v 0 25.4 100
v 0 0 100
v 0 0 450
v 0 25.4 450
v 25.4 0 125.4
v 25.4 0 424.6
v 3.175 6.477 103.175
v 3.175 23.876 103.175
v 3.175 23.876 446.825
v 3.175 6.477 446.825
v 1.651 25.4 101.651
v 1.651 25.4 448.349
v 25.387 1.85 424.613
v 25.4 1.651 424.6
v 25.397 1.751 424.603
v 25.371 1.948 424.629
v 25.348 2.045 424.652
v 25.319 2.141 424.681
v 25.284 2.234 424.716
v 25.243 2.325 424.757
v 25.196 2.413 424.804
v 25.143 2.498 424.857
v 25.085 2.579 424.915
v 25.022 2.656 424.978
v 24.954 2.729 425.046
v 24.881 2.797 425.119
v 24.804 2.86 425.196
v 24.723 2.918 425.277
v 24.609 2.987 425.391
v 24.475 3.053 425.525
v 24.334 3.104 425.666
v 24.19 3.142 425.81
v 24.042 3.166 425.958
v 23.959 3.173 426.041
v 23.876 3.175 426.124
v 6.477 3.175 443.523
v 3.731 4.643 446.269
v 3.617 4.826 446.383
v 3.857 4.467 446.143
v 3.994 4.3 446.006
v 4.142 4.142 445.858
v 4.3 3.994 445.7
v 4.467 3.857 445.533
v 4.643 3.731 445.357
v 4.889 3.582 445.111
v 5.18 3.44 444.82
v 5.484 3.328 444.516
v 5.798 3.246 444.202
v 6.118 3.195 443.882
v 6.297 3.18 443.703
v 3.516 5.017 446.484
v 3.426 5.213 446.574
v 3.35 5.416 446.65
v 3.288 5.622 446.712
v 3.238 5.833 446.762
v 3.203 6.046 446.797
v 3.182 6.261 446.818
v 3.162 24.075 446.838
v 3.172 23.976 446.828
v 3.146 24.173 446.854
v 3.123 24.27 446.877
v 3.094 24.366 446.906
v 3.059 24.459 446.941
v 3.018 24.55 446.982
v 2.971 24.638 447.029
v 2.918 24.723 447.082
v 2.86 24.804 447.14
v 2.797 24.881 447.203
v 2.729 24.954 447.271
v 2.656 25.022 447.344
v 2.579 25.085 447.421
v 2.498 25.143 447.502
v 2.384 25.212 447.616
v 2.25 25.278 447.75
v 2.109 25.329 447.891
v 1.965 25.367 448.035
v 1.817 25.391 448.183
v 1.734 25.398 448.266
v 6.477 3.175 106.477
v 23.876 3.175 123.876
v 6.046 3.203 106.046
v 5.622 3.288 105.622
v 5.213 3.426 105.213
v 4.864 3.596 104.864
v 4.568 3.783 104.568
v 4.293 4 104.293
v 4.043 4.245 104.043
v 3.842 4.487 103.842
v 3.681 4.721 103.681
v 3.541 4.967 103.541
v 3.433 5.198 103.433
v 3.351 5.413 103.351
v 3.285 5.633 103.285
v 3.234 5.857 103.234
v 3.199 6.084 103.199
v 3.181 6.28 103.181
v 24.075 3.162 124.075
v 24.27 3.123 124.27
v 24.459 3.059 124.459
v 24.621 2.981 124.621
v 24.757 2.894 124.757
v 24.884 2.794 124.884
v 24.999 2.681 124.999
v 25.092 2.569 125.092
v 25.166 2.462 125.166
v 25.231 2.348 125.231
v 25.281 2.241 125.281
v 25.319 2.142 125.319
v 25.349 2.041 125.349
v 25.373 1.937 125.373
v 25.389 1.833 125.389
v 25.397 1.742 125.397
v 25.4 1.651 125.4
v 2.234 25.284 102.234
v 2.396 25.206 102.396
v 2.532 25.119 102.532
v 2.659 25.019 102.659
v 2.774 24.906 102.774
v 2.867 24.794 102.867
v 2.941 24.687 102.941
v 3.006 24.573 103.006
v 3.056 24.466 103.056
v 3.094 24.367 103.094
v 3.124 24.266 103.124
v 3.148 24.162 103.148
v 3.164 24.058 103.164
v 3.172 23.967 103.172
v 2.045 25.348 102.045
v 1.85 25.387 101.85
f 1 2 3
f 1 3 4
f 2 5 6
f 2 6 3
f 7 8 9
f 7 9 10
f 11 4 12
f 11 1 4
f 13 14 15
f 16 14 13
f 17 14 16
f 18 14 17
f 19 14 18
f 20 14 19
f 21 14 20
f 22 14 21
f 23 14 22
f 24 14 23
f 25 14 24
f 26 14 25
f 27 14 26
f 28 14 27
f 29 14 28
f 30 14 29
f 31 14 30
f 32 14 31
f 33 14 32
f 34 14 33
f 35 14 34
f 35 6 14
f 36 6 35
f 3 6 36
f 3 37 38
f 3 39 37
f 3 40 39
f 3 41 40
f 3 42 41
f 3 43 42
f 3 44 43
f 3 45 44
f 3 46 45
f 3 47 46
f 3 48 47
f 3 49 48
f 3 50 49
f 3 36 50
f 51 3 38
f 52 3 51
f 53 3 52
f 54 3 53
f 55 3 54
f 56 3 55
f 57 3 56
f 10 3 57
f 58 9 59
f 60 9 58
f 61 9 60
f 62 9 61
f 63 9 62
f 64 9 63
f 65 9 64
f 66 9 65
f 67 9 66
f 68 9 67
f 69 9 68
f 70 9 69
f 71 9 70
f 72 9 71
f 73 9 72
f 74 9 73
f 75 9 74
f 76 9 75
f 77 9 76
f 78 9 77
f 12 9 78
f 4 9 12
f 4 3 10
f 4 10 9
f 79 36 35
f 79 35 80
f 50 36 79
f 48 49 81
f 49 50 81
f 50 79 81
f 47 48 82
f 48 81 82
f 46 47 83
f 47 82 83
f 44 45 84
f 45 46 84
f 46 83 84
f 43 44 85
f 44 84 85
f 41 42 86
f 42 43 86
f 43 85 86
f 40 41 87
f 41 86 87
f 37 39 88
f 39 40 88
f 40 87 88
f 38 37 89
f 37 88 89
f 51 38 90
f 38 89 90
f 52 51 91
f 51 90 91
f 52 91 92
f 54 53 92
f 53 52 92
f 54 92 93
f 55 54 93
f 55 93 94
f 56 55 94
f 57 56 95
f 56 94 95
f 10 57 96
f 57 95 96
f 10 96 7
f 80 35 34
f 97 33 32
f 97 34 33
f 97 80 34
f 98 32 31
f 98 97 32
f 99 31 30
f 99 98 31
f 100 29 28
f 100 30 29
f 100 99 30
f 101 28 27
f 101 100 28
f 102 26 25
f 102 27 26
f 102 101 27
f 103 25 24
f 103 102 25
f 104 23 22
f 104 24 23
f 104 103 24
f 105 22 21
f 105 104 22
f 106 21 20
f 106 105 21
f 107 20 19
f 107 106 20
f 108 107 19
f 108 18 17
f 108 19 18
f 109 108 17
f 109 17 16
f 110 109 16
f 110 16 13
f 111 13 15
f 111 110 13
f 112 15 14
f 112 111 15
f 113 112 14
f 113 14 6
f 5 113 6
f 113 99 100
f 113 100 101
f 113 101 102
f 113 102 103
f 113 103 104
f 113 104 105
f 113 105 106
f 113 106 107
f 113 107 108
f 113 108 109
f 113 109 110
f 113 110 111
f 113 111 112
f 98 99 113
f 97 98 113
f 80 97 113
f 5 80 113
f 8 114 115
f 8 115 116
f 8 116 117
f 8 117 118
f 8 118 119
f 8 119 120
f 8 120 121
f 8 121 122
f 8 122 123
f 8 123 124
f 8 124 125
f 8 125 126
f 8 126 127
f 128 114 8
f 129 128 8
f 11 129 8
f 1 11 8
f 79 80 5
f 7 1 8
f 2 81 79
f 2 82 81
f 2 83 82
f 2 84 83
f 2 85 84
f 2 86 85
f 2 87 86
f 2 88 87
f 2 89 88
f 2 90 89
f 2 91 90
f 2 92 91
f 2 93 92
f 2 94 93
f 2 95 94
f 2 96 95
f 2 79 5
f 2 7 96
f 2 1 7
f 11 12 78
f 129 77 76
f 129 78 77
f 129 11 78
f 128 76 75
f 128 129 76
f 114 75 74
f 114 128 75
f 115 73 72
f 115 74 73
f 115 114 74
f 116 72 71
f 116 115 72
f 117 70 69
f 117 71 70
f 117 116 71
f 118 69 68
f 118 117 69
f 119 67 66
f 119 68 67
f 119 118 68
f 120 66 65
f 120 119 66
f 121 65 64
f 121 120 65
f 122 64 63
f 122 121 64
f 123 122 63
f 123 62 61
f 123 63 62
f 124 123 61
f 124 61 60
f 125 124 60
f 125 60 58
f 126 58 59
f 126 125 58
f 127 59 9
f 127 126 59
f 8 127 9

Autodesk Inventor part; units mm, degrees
ref_plane "Start Plane" through (0, 0, 100) normal (0, 0, 1) x (1, 0, 0)
ref_plane "End Plane" through (0, 0, 450) normal (0, 0, 1) x (1, 0, 0)
sketch "Sketch" plane through (0, 0, 0) normal (0, 0, 1) x (1, 0, 0)
  line L0 (25.4, 0) -> (0, 0)
  line L1 (0, 0) -> (0, 25.4)
  line L2 (0, 25.4) -> (1.651, 25.4)
  line L3 (3.175, 23.876) -> (3.175, 6.477)
  line L4 (6.477, 3.175) -> (23.876, 3.175)
  line L5 (25.4, 1.651) -> (25.4, 0)
  line L6 (0, -11.0414) -> (0, 31.5385) construction
  line L7 (-11.0414, 0) -> (31.5385, 0) construction
  arc A0 (3.175, 6.477) -> (6.477, 3.175) centre (6.477, 6.477) ccw
  arc A1 (3.175, 23.876) -> (1.651, 25.4) centre (1.651, 23.876) ccw
  arc A2 (25.4, 1.651) -> (23.876, 3.175) centre (23.876, 1.651) ccw
  line L8 (0, 40.0545) -> (0, -19.5574) construction
  line L9 (-19.5574, 0) -> (40.0545, 0) construction
  point P0 (3.175, 25.4)
  point P1 (3.175, 3.175)
  point P2 (25.4, 3.175)
  dimension "d0" = 25.4
  dimension "d1" = 25.4
  dimension "d2" = 3.175
  dimension "d3" = 3.175
  dimension "d10" = 0
  dimension "d11" = 0
  dimension "d14" = 3.302
  dimension "d15" = 1.524
extrude "Body" add sketch "Sketch" along normal up to surface (350 mm away) from surface at 100
sketch "Sketch3" plane through (0, 0, 0) normal (0, 0, 1) x (1, 0, 0)
  line L0 (0, 0) -> (10, 0)
ref_plane "Work Plane3" through (0, 0, 0) normal (0, -1, 0) x (1, 0, 0)
ref_plane "Work Plane4" through (0, 12.7, 100) normal (0.7071, 0, -0.7071) x (-0.7071, 0, -0.7071)
split "Split1" plane through (0, 12.7, 100) removes the side toward (0.7071, 0, -0.7071)
ref_plane "Work Plane5" through (0, 12.7, 450) normal (0.7071, 0, 0.7071) x (0.7071, 0, -0.7071)
split "Split2" plane through (0, 12.7, 450) removes the side toward (0.7071, 0, 0.7071)
sketch "Sketch4" plane through (0, 0, 0) normal (0, -1, 0) x (1, 0, 0)
  line L0 (-2, 100) -> (12, 100) projected
  line L1 (-2, 450) -> (12, 450) projected
  dimension "d17" = 350
equation "\"d0\" = G_H"
equation "\"d1\" = G_H"
equation "\"d2\" = G_T"
equation "\"d3\" = G_T"
equation "\"d14\" = G_IR"
equation "\"d15\" = G_ER"
equation "\"d4\" = G_L"
equation "\"G_H\" = 25.4"
equation "\"G_T\" = 3.175"
equation "\"G_ER\" = 1.524"
equation "\"G_IR\" = 3.302"
equation "\"G_L\" = d17"
equation "\"ex\" = 0"
equation "\"G_OFFSET_START\" = -100"
equation "\"G_OFFSET_END\" = 0"
equation "\"d12\" = -G_OFFSET_START"
equation "\"d13\" = G_OFFSET_END + B_L"
equation "\"B_L\" = 450"
properties part number "AISC - L 1 x 1 x 1/8 - 13.78" material "Steel, Mild"
